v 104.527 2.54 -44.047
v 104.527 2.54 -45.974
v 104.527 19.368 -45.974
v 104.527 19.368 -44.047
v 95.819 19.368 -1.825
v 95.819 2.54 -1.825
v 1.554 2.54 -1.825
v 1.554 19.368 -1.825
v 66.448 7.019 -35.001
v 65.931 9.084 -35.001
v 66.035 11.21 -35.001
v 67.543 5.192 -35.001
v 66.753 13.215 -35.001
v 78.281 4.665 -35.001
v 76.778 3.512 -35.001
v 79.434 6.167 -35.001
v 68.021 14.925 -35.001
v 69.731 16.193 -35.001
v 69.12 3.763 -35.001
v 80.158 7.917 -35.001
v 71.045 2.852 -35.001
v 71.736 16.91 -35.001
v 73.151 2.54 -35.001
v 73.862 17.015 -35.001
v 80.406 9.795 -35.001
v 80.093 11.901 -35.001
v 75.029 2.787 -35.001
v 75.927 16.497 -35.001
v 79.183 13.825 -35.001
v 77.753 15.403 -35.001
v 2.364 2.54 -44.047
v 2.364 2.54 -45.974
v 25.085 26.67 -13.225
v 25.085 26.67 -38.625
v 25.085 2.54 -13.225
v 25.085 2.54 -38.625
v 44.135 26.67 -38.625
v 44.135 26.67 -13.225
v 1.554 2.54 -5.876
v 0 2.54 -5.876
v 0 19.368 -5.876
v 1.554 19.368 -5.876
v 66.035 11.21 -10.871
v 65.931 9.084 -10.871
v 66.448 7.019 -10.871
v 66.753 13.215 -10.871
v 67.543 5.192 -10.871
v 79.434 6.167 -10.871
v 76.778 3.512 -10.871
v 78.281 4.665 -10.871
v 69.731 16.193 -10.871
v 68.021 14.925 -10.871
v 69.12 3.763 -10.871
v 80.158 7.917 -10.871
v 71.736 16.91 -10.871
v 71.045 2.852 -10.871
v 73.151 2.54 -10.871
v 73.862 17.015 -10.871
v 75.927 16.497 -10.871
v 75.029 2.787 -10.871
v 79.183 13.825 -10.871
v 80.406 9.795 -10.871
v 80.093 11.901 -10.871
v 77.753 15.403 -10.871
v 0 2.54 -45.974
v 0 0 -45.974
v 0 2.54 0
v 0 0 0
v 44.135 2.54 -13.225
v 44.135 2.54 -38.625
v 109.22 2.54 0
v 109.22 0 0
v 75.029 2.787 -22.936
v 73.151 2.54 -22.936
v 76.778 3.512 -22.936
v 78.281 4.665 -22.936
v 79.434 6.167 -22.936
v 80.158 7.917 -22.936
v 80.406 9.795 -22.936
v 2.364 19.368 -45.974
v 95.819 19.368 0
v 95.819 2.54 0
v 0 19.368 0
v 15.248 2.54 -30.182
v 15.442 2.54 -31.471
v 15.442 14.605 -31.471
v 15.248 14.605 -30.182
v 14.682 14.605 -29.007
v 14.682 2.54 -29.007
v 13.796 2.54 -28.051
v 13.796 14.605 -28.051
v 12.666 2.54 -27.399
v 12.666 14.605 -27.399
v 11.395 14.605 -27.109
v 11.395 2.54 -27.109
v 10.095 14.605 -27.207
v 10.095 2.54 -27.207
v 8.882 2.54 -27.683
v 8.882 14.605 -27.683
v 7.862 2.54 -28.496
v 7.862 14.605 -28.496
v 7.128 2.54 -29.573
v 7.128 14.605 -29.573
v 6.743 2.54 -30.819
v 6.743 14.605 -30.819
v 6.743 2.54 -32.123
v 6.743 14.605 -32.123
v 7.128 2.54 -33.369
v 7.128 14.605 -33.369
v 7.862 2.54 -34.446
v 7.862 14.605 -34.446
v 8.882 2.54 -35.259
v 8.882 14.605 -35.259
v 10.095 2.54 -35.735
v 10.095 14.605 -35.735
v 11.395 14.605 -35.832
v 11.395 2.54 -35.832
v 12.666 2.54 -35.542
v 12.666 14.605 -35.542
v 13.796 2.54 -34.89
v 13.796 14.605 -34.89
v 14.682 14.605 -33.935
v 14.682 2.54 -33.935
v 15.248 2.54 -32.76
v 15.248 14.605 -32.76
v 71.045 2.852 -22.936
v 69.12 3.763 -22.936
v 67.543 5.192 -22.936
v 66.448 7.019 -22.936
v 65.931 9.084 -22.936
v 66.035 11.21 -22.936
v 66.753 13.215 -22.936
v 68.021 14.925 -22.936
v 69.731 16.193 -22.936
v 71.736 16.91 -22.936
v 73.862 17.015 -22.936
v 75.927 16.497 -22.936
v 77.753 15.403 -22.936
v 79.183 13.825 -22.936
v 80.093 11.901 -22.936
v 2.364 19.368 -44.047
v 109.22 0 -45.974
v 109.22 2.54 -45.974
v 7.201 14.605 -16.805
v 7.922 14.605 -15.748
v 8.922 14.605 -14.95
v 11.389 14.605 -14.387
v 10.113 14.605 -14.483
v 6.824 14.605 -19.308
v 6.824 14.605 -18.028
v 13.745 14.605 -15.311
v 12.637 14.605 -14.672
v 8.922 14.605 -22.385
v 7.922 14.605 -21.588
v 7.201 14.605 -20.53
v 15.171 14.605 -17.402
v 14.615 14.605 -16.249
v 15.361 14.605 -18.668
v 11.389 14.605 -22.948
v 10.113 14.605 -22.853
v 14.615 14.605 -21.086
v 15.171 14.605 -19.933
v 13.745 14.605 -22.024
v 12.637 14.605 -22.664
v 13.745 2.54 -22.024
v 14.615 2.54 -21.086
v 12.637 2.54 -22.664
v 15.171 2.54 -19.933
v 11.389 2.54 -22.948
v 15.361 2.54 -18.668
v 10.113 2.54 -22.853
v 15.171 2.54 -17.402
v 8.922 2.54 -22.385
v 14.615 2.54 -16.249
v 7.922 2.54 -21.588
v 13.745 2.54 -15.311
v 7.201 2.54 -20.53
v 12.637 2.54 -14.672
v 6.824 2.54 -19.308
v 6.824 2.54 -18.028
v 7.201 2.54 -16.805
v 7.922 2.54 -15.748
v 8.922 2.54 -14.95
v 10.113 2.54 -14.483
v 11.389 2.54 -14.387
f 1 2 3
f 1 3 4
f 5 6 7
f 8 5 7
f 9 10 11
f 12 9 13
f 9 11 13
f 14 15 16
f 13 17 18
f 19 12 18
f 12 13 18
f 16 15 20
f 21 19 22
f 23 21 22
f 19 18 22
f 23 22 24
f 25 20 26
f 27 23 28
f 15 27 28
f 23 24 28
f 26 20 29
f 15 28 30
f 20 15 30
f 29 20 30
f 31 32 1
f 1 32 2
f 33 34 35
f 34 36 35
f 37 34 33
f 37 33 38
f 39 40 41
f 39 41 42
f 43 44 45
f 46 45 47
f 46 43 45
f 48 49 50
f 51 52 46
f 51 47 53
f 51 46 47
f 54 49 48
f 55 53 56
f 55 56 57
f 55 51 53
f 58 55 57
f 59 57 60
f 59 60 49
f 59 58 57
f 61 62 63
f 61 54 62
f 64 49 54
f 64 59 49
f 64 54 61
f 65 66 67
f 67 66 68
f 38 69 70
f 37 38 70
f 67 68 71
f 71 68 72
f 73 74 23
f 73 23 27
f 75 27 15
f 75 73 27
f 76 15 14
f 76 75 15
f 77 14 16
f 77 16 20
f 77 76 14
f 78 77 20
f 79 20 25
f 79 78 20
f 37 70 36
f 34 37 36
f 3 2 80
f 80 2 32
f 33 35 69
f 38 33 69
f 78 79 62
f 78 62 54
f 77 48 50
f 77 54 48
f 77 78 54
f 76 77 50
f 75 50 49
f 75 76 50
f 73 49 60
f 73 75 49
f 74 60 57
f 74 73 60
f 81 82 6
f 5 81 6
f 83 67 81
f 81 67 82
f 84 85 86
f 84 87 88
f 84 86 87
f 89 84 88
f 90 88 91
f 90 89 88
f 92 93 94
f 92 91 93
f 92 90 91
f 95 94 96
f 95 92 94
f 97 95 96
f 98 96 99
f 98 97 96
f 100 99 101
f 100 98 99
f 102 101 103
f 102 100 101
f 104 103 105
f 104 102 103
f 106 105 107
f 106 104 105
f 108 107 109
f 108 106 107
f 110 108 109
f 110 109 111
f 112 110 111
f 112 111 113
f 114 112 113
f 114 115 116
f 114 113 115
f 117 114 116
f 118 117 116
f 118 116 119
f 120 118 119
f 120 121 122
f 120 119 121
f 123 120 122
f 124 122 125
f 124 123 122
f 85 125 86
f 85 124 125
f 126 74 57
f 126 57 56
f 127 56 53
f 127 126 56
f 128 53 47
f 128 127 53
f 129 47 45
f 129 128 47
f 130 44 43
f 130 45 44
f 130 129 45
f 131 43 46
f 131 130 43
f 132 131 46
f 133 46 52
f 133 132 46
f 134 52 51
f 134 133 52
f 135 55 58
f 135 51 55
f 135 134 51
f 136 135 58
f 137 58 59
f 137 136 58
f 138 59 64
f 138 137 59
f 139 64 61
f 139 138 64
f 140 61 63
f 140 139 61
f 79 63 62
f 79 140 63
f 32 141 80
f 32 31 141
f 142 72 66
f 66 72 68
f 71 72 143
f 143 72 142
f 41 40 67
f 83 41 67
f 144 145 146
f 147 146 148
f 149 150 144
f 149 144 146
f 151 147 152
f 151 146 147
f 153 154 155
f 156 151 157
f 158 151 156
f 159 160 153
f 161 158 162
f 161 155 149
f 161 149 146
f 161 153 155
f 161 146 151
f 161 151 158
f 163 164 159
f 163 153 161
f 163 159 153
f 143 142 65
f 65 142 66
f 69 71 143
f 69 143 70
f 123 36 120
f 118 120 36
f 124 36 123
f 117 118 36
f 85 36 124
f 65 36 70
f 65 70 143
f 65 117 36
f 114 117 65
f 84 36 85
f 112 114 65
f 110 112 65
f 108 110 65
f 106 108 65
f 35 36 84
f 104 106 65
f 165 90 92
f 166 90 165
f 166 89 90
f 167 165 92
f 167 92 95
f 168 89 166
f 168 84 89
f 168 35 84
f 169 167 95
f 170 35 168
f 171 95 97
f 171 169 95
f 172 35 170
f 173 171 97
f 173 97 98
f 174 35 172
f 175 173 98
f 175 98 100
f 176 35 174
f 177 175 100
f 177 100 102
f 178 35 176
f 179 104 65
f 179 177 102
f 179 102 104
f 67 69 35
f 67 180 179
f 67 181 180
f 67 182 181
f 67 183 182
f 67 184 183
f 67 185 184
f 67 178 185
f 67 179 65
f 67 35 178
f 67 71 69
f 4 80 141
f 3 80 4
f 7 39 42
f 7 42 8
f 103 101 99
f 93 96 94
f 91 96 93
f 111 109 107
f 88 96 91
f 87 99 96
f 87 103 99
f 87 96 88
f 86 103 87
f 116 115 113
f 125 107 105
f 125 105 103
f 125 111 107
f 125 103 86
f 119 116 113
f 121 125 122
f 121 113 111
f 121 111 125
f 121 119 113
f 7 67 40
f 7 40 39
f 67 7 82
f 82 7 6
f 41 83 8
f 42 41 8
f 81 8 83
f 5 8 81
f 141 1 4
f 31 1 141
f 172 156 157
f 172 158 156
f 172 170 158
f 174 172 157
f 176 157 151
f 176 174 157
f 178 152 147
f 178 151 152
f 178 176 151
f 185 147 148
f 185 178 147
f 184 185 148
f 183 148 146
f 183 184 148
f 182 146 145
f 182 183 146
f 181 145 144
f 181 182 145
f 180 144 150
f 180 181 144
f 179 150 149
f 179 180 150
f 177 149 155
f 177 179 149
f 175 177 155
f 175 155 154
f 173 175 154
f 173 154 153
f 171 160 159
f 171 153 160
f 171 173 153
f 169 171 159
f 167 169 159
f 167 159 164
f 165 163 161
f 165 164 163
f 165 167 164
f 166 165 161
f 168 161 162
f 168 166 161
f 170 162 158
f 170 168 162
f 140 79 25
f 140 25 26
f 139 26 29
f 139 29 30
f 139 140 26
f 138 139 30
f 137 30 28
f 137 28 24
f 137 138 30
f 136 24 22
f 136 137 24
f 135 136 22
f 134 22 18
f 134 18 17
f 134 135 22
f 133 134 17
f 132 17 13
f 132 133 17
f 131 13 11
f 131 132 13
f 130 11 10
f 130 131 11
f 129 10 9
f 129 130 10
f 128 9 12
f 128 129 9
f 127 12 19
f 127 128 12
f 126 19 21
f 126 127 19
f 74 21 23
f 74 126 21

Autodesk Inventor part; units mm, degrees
ref_plane "YZ Plane" through (0, 0, 0) normal (1, 0, 0) x (0, 1, 0)
ref_plane "XZ Plane" through (0, 0, 0) normal (0, 1, 0) x (-1, 0, 0)
sketch "Sketch1" plane through (0, 0, 0) normal (0, 1, 0) x (-1, 0, 0)
  line L0 (0, 0) -> (-109.22, 0)
  line L1 (-109.22, 0) -> (-109.22, -45.974)
  line L2 (-109.22, -45.974) -> (0, -45.974)
  line L3 (0, -45.974) -> (0, 0)
  dimension "d0" = 109.22
  dimension "d1" = 45.974
extrude "Extrusion1" add sketch "Sketch1" along normal blind 2.54
sketch "Sketch2" plane through (0, 2.54, 0) normal (0, 1, 0) x (1, 0, 0)
  line L0 (109.22, 0) -> (109.22, 45.974) projected
  line L1 (109.22, 45.974) -> (0, 45.974) projected
  line L2 (0, 45.974) -> (0, 0) projected
  line L3 (0, 0) -> (109.22, 0) projected
  line L4 (2.3641, 45.974) -> (104.5271, 45.974)
  line L5 (104.5271, 45.974) -> (104.5271, 44.0473)
  line L6 (104.5271, 44.0473) -> (2.3641, 44.0473)
  line L7 (2.3641, 44.0473) -> (2.3641, 45.974)
  line L8 (0, 5.8755) -> (1.5541, 5.8755)
  line L9 (1.5541, 5.8755) -> (1.5541, 0)
  line L10 (1.5541, 0) -> (0, 0)
  line L11 (0, 0) -> (0, 5.8755)
  line L12 (0, 0) -> (95.8194, 0)
  line L13 (95.8194, 0) -> (95.8194, 1.8254)
  line L14 (95.8194, 1.8254) -> (0, 1.8254)
  line L15 (0, 1.8254) -> (0, 0)
  point P0 (1.5541, 1.8254)
extrude "Extrusion2" add sketch "Sketch2" along normal blind 16.8275 separate body contours L3 L9 L14 L13 | L5 L6 L7 L1 | L3 L2 L14 L9 | L14 L2 L8 L9
sketch "Sketch3" plane through (0, 2.54, 0) normal (0, 1, 0) x (1, 0, 0)
  circle A0 centre (11.0685, 31.4708) radius 4.3739
  circle A1 centre (11.0685, 18.6677) radius 4.2928
  point P0 (0, 0)
extrude "Extrusion3" add sketch "Sketch3" along normal blind 12.065 bodies 1
sketch "Sketch4" plane through (0, 2.54, 0) normal (0, 1, 0) x (1, 0, 0)
  circle A0 centre (11.0685, 18.6677) radius 4.2928 projected
  circle A1 centre (11.0685, 31.4708) radius 4.3739 projected
  line L0 (0, 0) -> (109.22, 0) projected
  line L1 (109.22, 0) -> (109.22, 45.974) projected
  line L2 (109.22, 45.974) -> (0, 45.974) projected
  line L3 (0, 45.974) -> (0, 0) projected
  line L4 (44.1347, 38.6247) -> (25.0847, 38.6247)
  line L5 (25.0847, 38.6247) -> (25.0847, 13.2247)
  line L6 (25.0847, 13.2247) -> (44.1347, 13.2247)
  line L7 (44.1347, 13.2247) -> (44.1347, 38.6247)
  line L8 (44.1347, 38.6247) -> (25.0847, 13.2247) construction
  line L9 (25.0847, 38.6247) -> (44.1347, 13.2247) construction
  point P0 (34.6097, 25.9247)
  dimension "d8" = 19.05
  dimension "d9" = 25.4
extrude "Extrusion4" add sketch "Sketch4" along normal blind 24.13 contours L7 L6 L5 L4 bodies 1
ref_plane "Work Plane1" through (2.3641, 2.54, -22.9364) normal (0, 0, 1) x (1, 0, 0)
sketch "Sketch5" plane through (2.3641, 2.54, -22.9364) normal (0, 0, 1) x (1, 0, 0)
  line L0 (22.7205, 0) -> (41.7705, 0) projected
  line L1 (41.7705, 0) -> (22.7205, 0) projected
  line L2 (4.4115, 0) -> (12.9972, 0) projected
  line L3 (4.3304, 0) -> (13.0783, 0) projected
  line L4 (-2.3641, 0) -> (106.8559, 0) projected
  line L5 (106.8559, 0) -> (-2.3641, 0) projected
  circle A0 centre (70.7868, 7.2548) radius 7.2548
  line L6 (102.1629, 0) -> (0, 0) projected
  point P0 (-2.3641, -2.54)
  point P1 (93.4553, 0)
  point P2 (93.4553, 0)
extrude "Extrusion5" add sketch "Sketch5" along normal mid plane 24.13 bodies 1
properties part number "12vconverter"
